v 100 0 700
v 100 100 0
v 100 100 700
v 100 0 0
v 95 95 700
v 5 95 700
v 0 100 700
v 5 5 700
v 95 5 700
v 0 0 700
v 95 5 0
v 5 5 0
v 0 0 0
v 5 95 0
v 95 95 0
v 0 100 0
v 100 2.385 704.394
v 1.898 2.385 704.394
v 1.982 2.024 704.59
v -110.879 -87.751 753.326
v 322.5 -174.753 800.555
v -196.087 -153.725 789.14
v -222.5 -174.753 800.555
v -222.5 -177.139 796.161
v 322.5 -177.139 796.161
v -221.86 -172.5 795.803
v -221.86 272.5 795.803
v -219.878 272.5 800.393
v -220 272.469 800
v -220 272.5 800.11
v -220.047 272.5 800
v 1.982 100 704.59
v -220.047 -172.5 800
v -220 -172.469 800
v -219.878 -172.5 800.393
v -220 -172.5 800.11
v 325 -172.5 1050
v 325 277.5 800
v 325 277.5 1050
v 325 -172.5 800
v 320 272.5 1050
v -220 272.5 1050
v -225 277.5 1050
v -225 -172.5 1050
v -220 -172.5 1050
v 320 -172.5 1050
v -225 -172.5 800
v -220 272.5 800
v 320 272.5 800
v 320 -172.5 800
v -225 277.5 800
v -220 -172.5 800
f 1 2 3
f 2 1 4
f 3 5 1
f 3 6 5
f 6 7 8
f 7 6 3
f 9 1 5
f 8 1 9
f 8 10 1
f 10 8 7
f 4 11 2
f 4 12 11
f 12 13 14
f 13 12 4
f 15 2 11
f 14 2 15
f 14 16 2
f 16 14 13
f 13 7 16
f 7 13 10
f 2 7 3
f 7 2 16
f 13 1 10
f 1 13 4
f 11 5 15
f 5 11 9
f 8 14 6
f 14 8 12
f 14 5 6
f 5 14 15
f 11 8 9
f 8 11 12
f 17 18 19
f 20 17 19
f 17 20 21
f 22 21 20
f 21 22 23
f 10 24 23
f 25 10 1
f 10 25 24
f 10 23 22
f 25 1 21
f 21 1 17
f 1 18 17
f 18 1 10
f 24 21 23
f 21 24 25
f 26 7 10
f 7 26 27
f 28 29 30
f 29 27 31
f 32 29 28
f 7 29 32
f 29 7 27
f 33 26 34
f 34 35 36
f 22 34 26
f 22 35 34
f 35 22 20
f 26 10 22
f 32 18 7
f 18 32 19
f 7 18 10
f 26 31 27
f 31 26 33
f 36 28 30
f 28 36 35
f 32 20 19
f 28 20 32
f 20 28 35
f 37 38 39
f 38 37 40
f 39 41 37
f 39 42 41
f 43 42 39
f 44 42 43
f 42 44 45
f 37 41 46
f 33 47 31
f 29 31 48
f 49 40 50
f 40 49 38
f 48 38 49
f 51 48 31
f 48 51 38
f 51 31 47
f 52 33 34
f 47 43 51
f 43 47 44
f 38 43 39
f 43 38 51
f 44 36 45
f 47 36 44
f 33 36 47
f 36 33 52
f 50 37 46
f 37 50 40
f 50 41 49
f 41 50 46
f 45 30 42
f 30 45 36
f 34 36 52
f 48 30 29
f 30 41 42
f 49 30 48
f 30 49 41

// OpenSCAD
// file: helper.scad
module prism(l, w, h){
    polyhedron(
            points=[[0,0,0], [l,0,0], [l,w,0], [0,w,0], [0,w,h], [l,w,h]],
            faces=[[0,1,2,3],[5,4,3,2],[0,4,5,1],[0,3,4],[5,2,1]]
        );
}

module prism2(l, w) {
	polygon([[0,0], [l, 0], [l, w]]);
}

module tube(len,tubeSide,tubeThick,bCut=false,bAngle=0,tCut=false,tAngle=0) {
	difference() {
		cube([tubeSide,tubeSide,len]);
		if(bCut) {
			rotate_about_pt(bAngle, 0, [tubeSide/2, tubeSide/2,0]) {
				prism(tubeSide,tubeSide,tubeSide);
			}
		}
		if(tCut) {
			translate([0,0,len]) {
				rotate_about_pt(tAngle, 180, [tubeSide/2, tubeSide/2,0]) {
					prism(tubeSide,tubeSide,tubeSide);
				}
			}
		}
		translate([tubeThick,tubeThick,0]) {
			cube([tubeSide-2*tubeThick,tubeSide-2*tubeThick,len+1]);
		}
	}
}
// main file
include <helper.scad>

tubeSide=100;
tubeThick=5;

tH = 700;

bW = 550;
bD = 450;
bH = 250;
bT = tubeThick;
bOffset = 100;

module trap(w1,d,w2,h) {
	wO = (w2 - w1) / 2;

	// counter clockwise
	aT = [0,0,h];
	aB = [0,0,0];
	bT = [w1,0,h];
	bB = [w1,0,0];
	cT = [w1 + wO,d,h];
	cB = [w1 + wO,d,0];
	dT = [-wO,d,h];
	dB = [-wO,d,0];

	a = [0,0];
	b = [w1,0];
	c = [w1 + wO,d];
	d = [-wO,d];

	//     0   1   2   3   4   5   6   7
	ps = [aT, aB, bT, bB, cT, cB, dT, dB];
	fs = 
		[ [ 1, 2, 3, 0]
		, [ 2, 4, 5, 3]
		, [ 4, 6, 7, 5]
		, [ 6, 0, 1, 7]
		, [ 6, 4, 2, 0]
		, [ 5, 7, 1, 3]
		];
	//polyhedron(points = ps, faces= fs);
	linear_extrude(height = h) {
		polygon(points = [d, c, b, a]);
	}
}

module box() {
	difference() {
		cube([bW, bD, bH]);
		translate([bT,-0.1,-0.1]) {
			cube([bW - bT * 2, bD - bT + 0.1, bH + 0.2]);
		}
	}
}

module raiser() {
	dT = (bD - tubeSide) / 2;
	d = sqrt(pow(dT, 2) + pow(bOffset, 2));
	echo(dT);
	translate([0, tubeSide, 0]) {
		a = atan((bOffset - tubeThick) / dT);
		echo(a);
		rotate([a, 0, 0]) {
			//trap(tubeSide, d, bW - tubeThick * 2, tubeThick);
		}
	}
	translate([tubeSide, tubeThick/2, 0]) {
		a = atan((bOffset - tubeThick) / dT);
		echo(a);
		rotate([a, 0, 180]) {
			trap(tubeSide, d, bW - tubeThick, tubeThick);
		}
	}

	dT2 = (bW - tubeSide) / 2 - tubeThick;
	d2 = sqrt(pow(dT2, 2) + pow(bOffset, 2));
	translate([0, tubeThick/2, 0]) {
		a = atan((bOffset - tubeThick) / dT2);
		echo(a);
		rotate([a, 0, 90]) {
			trap(tubeSide, d2, bD - tubeThick, tubeThick);
		}
	}
}

union() {
	tube(tH, tubeSide, tubeThick);
	translate([0, -tubeThick/2, tH]) {
		raiser();
	}

	translate([-bW/2 + tubeSide/2, -bD/2 + tubeSide/2 + tubeThick/2, tH + bOffset]) {
		box();
	}

}
